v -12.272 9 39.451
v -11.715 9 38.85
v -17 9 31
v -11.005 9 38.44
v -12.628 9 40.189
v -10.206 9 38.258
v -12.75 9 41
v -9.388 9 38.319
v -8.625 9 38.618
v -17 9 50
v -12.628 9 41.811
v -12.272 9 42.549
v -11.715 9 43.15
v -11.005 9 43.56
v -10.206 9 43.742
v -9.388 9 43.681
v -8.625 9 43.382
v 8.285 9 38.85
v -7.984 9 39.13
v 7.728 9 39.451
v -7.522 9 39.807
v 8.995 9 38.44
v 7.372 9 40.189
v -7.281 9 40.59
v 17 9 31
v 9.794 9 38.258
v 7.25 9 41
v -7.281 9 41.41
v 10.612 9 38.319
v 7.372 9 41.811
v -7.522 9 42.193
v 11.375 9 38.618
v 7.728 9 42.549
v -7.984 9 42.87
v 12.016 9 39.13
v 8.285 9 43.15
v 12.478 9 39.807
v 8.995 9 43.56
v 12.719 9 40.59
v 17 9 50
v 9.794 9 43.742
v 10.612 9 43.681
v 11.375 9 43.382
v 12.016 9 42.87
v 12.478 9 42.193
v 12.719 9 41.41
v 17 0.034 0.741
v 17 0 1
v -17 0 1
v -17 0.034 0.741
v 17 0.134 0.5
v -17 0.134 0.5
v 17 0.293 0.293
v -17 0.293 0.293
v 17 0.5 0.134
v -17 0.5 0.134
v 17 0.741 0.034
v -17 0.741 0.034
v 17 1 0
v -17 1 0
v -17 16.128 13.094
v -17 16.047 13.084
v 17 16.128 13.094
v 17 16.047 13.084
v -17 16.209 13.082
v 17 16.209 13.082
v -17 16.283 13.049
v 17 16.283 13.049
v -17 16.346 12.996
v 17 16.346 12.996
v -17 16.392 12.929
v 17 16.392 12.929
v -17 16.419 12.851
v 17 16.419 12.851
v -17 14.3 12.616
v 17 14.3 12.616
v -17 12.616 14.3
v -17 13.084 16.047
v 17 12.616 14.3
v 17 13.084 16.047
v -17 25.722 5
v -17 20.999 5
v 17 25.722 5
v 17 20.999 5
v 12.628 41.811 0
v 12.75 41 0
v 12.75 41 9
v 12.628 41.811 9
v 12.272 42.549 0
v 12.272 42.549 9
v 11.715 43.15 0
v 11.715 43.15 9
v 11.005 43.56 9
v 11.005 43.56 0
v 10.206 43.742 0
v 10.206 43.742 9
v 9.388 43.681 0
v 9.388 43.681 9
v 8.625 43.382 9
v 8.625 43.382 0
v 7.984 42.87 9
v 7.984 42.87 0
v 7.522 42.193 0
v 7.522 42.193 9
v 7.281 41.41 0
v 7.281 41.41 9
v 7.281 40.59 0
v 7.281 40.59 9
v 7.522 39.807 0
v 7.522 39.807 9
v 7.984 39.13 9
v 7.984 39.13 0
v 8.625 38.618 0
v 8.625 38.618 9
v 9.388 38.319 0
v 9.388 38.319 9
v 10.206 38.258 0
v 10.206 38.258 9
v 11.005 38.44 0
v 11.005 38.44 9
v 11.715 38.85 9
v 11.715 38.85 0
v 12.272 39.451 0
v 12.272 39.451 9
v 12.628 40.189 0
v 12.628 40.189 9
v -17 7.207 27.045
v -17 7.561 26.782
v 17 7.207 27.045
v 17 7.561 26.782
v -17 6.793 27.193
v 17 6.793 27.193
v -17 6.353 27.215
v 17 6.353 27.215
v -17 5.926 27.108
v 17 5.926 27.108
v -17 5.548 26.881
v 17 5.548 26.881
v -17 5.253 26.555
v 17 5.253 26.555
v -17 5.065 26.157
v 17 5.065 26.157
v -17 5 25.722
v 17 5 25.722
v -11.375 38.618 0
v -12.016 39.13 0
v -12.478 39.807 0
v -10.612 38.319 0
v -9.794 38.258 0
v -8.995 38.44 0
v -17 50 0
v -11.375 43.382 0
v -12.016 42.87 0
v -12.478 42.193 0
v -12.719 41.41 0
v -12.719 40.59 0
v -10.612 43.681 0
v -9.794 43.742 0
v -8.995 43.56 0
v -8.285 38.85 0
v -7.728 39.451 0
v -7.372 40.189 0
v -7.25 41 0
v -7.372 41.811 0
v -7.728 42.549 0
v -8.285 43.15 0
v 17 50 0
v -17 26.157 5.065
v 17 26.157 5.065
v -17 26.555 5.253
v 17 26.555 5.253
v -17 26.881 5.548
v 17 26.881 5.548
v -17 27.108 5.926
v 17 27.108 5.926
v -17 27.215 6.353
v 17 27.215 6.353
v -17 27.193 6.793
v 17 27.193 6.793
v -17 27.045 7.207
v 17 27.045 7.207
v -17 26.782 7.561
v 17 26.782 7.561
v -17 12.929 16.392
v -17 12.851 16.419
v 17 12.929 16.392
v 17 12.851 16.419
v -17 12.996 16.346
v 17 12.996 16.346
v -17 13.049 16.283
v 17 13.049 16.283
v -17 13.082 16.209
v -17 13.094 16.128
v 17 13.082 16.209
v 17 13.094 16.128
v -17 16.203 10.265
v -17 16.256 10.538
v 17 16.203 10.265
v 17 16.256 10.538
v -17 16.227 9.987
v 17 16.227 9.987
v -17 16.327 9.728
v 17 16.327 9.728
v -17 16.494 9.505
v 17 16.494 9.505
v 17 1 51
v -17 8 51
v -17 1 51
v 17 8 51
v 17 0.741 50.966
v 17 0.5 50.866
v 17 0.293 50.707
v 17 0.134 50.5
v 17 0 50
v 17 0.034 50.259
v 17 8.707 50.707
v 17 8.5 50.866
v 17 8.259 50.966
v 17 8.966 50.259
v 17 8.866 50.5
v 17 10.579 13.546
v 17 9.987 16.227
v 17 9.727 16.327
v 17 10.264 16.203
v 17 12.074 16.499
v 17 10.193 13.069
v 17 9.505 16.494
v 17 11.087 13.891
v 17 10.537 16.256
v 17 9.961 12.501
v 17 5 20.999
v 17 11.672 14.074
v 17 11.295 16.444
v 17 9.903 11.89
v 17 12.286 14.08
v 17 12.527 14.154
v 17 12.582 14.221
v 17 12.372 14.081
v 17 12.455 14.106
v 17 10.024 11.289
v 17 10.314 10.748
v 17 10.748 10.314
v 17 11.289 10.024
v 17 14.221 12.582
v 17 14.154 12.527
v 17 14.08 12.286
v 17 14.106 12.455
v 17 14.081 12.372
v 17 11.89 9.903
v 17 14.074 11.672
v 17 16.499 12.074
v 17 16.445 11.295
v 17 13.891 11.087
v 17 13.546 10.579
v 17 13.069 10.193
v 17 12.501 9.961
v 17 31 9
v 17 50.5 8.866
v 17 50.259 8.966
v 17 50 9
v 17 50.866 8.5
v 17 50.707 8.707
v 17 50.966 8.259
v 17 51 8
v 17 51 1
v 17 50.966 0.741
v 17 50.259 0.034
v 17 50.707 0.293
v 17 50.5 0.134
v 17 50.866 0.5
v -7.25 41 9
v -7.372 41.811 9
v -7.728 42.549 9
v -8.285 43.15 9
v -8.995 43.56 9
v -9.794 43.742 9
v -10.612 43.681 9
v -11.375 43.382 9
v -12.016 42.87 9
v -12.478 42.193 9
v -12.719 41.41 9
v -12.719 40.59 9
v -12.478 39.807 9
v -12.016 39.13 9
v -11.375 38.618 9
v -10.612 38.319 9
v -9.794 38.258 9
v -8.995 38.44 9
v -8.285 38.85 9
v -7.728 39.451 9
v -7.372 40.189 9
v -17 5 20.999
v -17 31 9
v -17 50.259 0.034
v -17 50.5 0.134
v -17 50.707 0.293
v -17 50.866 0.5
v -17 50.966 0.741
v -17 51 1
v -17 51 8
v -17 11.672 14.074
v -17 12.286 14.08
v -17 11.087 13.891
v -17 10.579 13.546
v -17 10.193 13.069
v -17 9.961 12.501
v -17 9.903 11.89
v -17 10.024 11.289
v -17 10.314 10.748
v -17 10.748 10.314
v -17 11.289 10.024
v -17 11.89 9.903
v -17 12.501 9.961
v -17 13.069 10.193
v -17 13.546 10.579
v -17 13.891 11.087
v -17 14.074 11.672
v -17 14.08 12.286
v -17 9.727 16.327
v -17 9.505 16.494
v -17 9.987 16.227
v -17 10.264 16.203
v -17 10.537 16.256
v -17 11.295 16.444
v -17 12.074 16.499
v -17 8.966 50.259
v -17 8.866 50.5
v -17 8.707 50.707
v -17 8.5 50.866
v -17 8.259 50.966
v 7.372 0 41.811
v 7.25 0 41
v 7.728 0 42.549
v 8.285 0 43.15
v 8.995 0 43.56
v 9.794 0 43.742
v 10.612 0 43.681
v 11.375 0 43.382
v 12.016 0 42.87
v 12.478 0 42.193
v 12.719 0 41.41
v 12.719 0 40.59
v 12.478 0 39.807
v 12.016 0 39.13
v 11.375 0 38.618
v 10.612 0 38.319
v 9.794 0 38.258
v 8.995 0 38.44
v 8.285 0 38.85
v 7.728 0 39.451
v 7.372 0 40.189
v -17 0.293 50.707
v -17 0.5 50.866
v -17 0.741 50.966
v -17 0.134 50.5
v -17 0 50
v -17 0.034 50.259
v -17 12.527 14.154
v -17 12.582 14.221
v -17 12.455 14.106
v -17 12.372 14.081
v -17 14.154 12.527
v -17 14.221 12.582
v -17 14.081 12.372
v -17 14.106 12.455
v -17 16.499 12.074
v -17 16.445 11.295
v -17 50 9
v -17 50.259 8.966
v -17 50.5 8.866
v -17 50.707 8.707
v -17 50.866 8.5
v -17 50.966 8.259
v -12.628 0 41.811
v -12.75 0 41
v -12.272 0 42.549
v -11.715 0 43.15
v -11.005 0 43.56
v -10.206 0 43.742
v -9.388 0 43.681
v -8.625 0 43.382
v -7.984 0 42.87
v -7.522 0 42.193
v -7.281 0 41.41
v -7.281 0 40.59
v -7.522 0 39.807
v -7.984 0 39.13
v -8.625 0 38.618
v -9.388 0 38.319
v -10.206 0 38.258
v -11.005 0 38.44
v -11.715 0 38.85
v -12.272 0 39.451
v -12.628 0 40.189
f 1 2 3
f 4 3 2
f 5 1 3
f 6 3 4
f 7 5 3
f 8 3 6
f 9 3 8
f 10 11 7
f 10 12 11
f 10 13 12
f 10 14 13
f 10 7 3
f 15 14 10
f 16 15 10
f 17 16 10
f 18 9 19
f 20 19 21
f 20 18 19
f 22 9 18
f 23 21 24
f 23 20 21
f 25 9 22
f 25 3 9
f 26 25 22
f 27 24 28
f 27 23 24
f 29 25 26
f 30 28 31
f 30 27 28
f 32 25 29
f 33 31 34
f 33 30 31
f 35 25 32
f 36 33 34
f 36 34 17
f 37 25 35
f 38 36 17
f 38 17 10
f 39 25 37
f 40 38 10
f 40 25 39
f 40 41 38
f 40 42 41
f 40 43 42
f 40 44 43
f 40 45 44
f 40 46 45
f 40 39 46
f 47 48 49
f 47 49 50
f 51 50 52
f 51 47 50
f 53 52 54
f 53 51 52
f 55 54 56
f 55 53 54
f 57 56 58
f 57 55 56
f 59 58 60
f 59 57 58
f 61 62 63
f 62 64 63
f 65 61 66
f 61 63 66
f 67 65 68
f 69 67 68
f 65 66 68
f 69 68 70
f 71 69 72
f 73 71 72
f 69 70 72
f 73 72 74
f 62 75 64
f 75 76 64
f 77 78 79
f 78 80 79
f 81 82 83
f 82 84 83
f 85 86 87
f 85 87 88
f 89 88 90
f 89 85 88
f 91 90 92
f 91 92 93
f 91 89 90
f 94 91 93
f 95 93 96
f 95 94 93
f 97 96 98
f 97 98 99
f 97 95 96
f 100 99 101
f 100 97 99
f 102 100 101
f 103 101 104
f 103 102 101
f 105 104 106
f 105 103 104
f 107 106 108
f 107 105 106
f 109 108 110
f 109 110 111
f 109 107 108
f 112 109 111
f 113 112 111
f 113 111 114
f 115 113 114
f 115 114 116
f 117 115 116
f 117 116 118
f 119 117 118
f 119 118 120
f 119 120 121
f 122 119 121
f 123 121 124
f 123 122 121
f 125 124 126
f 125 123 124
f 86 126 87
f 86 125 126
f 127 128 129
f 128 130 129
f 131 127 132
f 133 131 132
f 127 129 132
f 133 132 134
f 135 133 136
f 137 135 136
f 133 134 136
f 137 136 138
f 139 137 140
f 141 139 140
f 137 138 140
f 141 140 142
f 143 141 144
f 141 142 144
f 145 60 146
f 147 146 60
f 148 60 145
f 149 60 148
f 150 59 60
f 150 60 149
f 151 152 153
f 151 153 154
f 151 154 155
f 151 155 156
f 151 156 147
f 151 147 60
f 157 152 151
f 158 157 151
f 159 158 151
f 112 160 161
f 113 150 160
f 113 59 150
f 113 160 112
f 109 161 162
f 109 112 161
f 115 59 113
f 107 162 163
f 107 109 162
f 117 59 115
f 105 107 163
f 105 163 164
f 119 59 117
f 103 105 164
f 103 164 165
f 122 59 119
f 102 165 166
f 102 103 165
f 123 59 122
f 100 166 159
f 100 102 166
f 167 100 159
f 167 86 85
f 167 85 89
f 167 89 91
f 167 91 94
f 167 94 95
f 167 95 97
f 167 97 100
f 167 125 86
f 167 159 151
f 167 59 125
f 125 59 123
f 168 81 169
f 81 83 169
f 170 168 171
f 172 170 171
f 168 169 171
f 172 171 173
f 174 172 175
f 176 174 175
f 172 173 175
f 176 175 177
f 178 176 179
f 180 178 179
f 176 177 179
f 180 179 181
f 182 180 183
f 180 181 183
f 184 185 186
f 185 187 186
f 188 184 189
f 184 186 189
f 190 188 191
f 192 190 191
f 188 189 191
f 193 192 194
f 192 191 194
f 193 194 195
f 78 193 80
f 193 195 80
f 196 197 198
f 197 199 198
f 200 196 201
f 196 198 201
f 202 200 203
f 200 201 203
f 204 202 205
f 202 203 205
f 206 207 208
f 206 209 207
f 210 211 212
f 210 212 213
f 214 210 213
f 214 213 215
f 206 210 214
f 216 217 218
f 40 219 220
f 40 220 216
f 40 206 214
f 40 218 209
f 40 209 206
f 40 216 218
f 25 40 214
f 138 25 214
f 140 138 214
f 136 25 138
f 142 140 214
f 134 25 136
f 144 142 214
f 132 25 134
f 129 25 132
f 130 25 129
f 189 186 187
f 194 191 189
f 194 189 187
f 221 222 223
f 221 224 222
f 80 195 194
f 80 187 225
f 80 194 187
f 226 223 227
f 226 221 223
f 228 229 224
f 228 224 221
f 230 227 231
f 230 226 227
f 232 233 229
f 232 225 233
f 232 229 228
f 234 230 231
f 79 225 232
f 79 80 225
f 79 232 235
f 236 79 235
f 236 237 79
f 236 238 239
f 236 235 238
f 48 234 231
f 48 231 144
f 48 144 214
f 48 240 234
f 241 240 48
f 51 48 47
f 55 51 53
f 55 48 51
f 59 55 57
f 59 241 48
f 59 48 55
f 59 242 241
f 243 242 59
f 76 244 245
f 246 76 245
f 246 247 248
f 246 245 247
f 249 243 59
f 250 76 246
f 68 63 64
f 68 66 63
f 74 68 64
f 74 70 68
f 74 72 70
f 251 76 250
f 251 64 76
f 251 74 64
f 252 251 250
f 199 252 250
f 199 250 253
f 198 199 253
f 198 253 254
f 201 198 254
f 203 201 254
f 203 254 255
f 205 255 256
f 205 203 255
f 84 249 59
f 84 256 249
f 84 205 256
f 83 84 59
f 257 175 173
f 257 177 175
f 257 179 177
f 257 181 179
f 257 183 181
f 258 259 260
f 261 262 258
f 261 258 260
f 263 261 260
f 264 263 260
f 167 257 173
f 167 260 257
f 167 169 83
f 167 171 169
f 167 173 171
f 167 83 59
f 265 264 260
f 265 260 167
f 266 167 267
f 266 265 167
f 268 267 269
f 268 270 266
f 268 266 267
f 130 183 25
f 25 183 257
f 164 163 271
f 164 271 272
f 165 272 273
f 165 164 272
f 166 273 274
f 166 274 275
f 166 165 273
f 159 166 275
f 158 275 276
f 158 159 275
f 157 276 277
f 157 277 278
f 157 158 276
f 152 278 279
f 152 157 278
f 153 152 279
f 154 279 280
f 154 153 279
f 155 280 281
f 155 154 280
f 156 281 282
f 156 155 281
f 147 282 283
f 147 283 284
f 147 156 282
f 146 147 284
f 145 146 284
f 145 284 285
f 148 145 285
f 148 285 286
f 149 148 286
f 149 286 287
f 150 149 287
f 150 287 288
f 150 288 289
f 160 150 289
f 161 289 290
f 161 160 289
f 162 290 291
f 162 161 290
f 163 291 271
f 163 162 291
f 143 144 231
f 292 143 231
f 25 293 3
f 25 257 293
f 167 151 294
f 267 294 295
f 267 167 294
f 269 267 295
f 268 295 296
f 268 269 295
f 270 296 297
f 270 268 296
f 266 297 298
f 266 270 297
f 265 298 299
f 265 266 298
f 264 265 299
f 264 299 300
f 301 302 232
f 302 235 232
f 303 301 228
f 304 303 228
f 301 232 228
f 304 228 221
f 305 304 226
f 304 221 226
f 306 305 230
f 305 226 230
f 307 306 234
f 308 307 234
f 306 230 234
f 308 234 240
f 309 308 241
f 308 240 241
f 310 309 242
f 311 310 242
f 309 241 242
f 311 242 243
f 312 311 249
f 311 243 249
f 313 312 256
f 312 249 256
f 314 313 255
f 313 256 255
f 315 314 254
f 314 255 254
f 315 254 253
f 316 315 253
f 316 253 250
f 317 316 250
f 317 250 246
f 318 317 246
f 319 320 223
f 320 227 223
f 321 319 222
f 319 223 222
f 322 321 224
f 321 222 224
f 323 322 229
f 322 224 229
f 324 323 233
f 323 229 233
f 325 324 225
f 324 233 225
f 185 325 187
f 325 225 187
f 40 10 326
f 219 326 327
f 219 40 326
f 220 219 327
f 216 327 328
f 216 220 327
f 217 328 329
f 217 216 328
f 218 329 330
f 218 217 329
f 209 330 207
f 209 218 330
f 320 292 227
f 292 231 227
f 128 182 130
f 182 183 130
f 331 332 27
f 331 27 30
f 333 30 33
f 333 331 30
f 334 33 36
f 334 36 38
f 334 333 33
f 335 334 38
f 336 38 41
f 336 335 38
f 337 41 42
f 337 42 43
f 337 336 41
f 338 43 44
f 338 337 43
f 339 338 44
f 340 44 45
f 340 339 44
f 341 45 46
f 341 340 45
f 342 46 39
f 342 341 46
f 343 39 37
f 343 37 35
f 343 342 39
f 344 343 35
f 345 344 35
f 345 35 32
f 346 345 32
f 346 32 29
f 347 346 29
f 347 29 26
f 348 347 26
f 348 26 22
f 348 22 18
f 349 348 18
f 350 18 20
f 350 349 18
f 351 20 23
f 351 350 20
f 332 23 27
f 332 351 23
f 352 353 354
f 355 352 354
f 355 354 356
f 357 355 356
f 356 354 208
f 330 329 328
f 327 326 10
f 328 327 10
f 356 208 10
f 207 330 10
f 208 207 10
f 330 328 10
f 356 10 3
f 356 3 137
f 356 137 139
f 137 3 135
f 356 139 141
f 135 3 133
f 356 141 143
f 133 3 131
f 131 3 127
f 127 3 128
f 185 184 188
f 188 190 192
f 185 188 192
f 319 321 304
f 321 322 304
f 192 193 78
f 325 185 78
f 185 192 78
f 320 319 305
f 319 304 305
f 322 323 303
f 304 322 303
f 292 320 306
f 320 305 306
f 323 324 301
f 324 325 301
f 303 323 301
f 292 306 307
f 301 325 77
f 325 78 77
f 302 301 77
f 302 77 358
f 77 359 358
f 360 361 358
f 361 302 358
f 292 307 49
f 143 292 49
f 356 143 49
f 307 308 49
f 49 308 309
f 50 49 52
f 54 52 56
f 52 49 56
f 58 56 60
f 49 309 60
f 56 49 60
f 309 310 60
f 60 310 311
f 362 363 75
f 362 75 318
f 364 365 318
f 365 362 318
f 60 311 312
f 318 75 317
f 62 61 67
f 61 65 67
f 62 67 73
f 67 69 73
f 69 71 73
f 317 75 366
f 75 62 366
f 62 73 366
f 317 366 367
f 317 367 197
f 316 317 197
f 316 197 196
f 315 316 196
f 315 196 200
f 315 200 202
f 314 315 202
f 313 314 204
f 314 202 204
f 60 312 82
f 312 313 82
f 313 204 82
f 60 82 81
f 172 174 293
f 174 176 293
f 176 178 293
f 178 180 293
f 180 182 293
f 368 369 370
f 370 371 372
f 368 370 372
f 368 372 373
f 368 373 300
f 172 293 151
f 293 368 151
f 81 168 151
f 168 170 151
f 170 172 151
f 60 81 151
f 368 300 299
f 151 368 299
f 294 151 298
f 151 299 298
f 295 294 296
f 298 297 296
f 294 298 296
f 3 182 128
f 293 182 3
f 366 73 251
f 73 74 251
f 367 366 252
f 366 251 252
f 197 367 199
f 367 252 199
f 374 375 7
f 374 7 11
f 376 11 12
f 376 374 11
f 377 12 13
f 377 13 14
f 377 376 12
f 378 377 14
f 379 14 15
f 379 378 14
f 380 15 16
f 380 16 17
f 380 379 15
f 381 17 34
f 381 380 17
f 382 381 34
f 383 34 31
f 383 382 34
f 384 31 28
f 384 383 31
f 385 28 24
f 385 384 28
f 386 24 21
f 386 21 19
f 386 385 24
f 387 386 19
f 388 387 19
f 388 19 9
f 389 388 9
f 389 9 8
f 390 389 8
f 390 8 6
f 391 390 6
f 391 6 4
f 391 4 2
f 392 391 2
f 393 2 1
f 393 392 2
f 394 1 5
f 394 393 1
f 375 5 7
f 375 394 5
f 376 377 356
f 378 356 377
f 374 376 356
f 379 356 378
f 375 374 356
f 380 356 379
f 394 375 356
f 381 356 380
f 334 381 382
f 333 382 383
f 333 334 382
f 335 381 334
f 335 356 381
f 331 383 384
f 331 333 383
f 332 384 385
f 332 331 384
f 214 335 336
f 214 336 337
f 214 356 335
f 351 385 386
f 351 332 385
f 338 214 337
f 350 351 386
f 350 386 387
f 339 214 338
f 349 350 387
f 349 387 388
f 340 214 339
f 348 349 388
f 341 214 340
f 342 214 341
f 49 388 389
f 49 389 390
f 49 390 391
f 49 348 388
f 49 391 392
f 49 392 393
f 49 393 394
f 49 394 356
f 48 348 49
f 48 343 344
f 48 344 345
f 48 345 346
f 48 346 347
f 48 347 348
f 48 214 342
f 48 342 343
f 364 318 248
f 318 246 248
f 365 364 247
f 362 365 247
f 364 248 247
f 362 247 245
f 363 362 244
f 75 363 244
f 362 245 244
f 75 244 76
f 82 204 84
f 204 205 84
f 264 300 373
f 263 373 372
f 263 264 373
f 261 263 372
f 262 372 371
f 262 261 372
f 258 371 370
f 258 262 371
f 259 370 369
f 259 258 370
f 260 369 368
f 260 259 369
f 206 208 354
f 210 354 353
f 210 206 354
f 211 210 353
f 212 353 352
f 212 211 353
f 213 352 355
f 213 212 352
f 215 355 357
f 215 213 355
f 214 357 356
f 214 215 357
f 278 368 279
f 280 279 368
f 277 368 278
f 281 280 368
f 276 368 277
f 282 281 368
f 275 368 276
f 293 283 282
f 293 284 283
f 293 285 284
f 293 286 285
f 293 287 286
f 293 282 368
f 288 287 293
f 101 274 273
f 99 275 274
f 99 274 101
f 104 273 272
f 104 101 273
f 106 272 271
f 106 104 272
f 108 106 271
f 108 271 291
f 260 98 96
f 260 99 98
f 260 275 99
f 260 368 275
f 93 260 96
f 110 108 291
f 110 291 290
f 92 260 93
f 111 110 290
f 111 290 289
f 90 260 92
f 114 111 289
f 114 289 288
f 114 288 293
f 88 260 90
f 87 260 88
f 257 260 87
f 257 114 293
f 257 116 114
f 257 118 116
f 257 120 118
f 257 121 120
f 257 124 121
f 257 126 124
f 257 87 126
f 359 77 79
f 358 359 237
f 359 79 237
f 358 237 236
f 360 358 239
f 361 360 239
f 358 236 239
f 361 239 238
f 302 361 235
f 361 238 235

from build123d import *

# Parameters (mm, degrees)
BOSS_EXTRUDE1_DEPTH      = 17
BOSS_EXTRUDE1_DEPTH_BACK = 17
SKETCH2_R                = 2.75
CUT_EXTRUDE1_DEPTH       = 9
SKETCH3_R                = 2.75
CUT_EXTRUDE2_DEPTH       = 9
SKETCH4_R                = 2.75
CUT_EXTRUDE3_DEPTH       = 9
SKETCH5_R                = 2.75
CUT_EXTRUDE4_DEPTH       = 9


with BuildPart() as part:
    # Sketch1 → Boss-Extrude1 (new, two sides: drawn at the far end of the back side and taken through both)
    with BuildSketch(Plane(origin=(0, 0, 0), x_dir=(0, 0, -1), z_dir=(1, 0, 0)).offset(-BOSS_EXTRUDE1_DEPTH_BACK)):
        with BuildLine():
            Line((-50, 0), (-1, 0))
            ThreePointArc((-1, 0), (-0.292893219, 0.292893219), (0, 1))
            Line((0, 1), (0, 50))
            ThreePointArc((0, 50), (-0.292893219, 50.707106781), (-1, 51))
            Line((-1, 51), (-8, 51))
            ThreePointArc((-8, 51), (-8.707106781, 50.707106781), (-9, 50))
            Line((-9, 50), (-9, 31))
            Line((-9, 31), (-31, 9))
            Line((-31, 9), (-50, 9))
            ThreePointArc((-50, 9), (-50.707106781, 8.707106781), (-51, 8))
            Line((-51, 8), (-51, 1))
            ThreePointArc((-51, 1), (-50.707106781, 0.292893219), (-50, 0))
        make_face()
        with BuildLine():
            Line((-25.721825407, 5), (-20.999285733, 5))
            Line((-20.999285733, 5), (-16.494036438, 9.505249294))
            ThreePointArc((-16.494036438, 9.505249294), (-16.226979866, 9.987090789), (-16.255625497, 10.537245192))
            ThreePointArc((-16.255625497, 10.537245192), (-16.488859314, 11.683547702), (-16.418755424, 12.851234691))
            ThreePointArc((-16.418755424, 12.851234691), (-16.283360667, 13.048766752), (-16.046526031, 13.084263382))
            Line((-16.046526031, 13.084263382), (-14.300039569, 12.616293745))
            ThreePointArc((-14.300039569, 12.616293745), (-14.127781033, 12.492491496), (-14.080474622, 12.285701498))
            ThreePointArc((-14.080474622, 12.285701498), (-10.515075745, 10.515075774), (-12.285701539, 14.080474617))
            ThreePointArc((-12.285701539, 14.080474617), (-12.492491514, 14.127781045), (-12.616293745, 14.300039569))
            Line((-12.616293745, 14.300039569), (-13.084263382, 16.046526031))
            ThreePointArc((-13.084263382, 16.046526031), (-13.048766728, 16.283360705), (-12.851234602, 16.418755442))
            ThreePointArc((-12.851234602, 16.418755442), (-11.683774102, 16.488875269), (-10.537674556, 16.255773055))
            ThreePointArc((-10.537674556, 16.255773055), (-9.987311976, 16.226928716), (-9.505249294, 16.494036438))
            Line((-9.505249294, 16.494036438), (-5, 20.999285733))
            Line((-5, 20.999285733), (-5, 25.721825407))
            ThreePointArc((-5, 25.721825407), (-5.925974851, 27.107644706), (-7.560660172, 26.782485579))
            Line((-7.560660172, 26.782485579), (-26.782485579, 7.560660172))
            ThreePointArc((-26.782485579, 7.560660172), (-27.107644706, 5.925974851), (-25.721825407, 5))
        make_face(mode=Mode.SUBTRACT)
    extrude(amount=BOSS_EXTRUDE1_DEPTH + BOSS_EXTRUDE1_DEPTH_BACK)

    # Sketch2 → Cut-Extrude1 (cut)
    with BuildSketch(Plane(origin=(0, 0, 0), x_dir=(-1, 0, 0), z_dir=(0, 1, 0))):
        with Locations((10, 41)):
            Circle(SKETCH2_R)
    extrude(amount=CUT_EXTRUDE1_DEPTH, mode=Mode.SUBTRACT)

    # Sketch3 → Cut-Extrude2 (cut)
    with BuildSketch(Plane(origin=(0, 0, 0), x_dir=(-1, 0, 0), z_dir=(0, 1, 0))):
        with Locations((-10, 41)):
            Circle(SKETCH3_R)
    extrude(amount=CUT_EXTRUDE2_DEPTH, mode=Mode.SUBTRACT)

    # Sketch4 → Cut-Extrude3 (cut)
    with BuildSketch(Plane.XY):
        with Locations((-10, 41)):
            Circle(SKETCH4_R)
    extrude(amount=CUT_EXTRUDE3_DEPTH, mode=Mode.SUBTRACT)

    # Sketch5 → Cut-Extrude4 (cut)
    with BuildSketch(Plane.XY):
        with Locations((10, 41)):
            Circle(SKETCH5_R)
    extrude(amount=CUT_EXTRUDE4_DEPTH, mode=Mode.SUBTRACT)


solid = part.part
